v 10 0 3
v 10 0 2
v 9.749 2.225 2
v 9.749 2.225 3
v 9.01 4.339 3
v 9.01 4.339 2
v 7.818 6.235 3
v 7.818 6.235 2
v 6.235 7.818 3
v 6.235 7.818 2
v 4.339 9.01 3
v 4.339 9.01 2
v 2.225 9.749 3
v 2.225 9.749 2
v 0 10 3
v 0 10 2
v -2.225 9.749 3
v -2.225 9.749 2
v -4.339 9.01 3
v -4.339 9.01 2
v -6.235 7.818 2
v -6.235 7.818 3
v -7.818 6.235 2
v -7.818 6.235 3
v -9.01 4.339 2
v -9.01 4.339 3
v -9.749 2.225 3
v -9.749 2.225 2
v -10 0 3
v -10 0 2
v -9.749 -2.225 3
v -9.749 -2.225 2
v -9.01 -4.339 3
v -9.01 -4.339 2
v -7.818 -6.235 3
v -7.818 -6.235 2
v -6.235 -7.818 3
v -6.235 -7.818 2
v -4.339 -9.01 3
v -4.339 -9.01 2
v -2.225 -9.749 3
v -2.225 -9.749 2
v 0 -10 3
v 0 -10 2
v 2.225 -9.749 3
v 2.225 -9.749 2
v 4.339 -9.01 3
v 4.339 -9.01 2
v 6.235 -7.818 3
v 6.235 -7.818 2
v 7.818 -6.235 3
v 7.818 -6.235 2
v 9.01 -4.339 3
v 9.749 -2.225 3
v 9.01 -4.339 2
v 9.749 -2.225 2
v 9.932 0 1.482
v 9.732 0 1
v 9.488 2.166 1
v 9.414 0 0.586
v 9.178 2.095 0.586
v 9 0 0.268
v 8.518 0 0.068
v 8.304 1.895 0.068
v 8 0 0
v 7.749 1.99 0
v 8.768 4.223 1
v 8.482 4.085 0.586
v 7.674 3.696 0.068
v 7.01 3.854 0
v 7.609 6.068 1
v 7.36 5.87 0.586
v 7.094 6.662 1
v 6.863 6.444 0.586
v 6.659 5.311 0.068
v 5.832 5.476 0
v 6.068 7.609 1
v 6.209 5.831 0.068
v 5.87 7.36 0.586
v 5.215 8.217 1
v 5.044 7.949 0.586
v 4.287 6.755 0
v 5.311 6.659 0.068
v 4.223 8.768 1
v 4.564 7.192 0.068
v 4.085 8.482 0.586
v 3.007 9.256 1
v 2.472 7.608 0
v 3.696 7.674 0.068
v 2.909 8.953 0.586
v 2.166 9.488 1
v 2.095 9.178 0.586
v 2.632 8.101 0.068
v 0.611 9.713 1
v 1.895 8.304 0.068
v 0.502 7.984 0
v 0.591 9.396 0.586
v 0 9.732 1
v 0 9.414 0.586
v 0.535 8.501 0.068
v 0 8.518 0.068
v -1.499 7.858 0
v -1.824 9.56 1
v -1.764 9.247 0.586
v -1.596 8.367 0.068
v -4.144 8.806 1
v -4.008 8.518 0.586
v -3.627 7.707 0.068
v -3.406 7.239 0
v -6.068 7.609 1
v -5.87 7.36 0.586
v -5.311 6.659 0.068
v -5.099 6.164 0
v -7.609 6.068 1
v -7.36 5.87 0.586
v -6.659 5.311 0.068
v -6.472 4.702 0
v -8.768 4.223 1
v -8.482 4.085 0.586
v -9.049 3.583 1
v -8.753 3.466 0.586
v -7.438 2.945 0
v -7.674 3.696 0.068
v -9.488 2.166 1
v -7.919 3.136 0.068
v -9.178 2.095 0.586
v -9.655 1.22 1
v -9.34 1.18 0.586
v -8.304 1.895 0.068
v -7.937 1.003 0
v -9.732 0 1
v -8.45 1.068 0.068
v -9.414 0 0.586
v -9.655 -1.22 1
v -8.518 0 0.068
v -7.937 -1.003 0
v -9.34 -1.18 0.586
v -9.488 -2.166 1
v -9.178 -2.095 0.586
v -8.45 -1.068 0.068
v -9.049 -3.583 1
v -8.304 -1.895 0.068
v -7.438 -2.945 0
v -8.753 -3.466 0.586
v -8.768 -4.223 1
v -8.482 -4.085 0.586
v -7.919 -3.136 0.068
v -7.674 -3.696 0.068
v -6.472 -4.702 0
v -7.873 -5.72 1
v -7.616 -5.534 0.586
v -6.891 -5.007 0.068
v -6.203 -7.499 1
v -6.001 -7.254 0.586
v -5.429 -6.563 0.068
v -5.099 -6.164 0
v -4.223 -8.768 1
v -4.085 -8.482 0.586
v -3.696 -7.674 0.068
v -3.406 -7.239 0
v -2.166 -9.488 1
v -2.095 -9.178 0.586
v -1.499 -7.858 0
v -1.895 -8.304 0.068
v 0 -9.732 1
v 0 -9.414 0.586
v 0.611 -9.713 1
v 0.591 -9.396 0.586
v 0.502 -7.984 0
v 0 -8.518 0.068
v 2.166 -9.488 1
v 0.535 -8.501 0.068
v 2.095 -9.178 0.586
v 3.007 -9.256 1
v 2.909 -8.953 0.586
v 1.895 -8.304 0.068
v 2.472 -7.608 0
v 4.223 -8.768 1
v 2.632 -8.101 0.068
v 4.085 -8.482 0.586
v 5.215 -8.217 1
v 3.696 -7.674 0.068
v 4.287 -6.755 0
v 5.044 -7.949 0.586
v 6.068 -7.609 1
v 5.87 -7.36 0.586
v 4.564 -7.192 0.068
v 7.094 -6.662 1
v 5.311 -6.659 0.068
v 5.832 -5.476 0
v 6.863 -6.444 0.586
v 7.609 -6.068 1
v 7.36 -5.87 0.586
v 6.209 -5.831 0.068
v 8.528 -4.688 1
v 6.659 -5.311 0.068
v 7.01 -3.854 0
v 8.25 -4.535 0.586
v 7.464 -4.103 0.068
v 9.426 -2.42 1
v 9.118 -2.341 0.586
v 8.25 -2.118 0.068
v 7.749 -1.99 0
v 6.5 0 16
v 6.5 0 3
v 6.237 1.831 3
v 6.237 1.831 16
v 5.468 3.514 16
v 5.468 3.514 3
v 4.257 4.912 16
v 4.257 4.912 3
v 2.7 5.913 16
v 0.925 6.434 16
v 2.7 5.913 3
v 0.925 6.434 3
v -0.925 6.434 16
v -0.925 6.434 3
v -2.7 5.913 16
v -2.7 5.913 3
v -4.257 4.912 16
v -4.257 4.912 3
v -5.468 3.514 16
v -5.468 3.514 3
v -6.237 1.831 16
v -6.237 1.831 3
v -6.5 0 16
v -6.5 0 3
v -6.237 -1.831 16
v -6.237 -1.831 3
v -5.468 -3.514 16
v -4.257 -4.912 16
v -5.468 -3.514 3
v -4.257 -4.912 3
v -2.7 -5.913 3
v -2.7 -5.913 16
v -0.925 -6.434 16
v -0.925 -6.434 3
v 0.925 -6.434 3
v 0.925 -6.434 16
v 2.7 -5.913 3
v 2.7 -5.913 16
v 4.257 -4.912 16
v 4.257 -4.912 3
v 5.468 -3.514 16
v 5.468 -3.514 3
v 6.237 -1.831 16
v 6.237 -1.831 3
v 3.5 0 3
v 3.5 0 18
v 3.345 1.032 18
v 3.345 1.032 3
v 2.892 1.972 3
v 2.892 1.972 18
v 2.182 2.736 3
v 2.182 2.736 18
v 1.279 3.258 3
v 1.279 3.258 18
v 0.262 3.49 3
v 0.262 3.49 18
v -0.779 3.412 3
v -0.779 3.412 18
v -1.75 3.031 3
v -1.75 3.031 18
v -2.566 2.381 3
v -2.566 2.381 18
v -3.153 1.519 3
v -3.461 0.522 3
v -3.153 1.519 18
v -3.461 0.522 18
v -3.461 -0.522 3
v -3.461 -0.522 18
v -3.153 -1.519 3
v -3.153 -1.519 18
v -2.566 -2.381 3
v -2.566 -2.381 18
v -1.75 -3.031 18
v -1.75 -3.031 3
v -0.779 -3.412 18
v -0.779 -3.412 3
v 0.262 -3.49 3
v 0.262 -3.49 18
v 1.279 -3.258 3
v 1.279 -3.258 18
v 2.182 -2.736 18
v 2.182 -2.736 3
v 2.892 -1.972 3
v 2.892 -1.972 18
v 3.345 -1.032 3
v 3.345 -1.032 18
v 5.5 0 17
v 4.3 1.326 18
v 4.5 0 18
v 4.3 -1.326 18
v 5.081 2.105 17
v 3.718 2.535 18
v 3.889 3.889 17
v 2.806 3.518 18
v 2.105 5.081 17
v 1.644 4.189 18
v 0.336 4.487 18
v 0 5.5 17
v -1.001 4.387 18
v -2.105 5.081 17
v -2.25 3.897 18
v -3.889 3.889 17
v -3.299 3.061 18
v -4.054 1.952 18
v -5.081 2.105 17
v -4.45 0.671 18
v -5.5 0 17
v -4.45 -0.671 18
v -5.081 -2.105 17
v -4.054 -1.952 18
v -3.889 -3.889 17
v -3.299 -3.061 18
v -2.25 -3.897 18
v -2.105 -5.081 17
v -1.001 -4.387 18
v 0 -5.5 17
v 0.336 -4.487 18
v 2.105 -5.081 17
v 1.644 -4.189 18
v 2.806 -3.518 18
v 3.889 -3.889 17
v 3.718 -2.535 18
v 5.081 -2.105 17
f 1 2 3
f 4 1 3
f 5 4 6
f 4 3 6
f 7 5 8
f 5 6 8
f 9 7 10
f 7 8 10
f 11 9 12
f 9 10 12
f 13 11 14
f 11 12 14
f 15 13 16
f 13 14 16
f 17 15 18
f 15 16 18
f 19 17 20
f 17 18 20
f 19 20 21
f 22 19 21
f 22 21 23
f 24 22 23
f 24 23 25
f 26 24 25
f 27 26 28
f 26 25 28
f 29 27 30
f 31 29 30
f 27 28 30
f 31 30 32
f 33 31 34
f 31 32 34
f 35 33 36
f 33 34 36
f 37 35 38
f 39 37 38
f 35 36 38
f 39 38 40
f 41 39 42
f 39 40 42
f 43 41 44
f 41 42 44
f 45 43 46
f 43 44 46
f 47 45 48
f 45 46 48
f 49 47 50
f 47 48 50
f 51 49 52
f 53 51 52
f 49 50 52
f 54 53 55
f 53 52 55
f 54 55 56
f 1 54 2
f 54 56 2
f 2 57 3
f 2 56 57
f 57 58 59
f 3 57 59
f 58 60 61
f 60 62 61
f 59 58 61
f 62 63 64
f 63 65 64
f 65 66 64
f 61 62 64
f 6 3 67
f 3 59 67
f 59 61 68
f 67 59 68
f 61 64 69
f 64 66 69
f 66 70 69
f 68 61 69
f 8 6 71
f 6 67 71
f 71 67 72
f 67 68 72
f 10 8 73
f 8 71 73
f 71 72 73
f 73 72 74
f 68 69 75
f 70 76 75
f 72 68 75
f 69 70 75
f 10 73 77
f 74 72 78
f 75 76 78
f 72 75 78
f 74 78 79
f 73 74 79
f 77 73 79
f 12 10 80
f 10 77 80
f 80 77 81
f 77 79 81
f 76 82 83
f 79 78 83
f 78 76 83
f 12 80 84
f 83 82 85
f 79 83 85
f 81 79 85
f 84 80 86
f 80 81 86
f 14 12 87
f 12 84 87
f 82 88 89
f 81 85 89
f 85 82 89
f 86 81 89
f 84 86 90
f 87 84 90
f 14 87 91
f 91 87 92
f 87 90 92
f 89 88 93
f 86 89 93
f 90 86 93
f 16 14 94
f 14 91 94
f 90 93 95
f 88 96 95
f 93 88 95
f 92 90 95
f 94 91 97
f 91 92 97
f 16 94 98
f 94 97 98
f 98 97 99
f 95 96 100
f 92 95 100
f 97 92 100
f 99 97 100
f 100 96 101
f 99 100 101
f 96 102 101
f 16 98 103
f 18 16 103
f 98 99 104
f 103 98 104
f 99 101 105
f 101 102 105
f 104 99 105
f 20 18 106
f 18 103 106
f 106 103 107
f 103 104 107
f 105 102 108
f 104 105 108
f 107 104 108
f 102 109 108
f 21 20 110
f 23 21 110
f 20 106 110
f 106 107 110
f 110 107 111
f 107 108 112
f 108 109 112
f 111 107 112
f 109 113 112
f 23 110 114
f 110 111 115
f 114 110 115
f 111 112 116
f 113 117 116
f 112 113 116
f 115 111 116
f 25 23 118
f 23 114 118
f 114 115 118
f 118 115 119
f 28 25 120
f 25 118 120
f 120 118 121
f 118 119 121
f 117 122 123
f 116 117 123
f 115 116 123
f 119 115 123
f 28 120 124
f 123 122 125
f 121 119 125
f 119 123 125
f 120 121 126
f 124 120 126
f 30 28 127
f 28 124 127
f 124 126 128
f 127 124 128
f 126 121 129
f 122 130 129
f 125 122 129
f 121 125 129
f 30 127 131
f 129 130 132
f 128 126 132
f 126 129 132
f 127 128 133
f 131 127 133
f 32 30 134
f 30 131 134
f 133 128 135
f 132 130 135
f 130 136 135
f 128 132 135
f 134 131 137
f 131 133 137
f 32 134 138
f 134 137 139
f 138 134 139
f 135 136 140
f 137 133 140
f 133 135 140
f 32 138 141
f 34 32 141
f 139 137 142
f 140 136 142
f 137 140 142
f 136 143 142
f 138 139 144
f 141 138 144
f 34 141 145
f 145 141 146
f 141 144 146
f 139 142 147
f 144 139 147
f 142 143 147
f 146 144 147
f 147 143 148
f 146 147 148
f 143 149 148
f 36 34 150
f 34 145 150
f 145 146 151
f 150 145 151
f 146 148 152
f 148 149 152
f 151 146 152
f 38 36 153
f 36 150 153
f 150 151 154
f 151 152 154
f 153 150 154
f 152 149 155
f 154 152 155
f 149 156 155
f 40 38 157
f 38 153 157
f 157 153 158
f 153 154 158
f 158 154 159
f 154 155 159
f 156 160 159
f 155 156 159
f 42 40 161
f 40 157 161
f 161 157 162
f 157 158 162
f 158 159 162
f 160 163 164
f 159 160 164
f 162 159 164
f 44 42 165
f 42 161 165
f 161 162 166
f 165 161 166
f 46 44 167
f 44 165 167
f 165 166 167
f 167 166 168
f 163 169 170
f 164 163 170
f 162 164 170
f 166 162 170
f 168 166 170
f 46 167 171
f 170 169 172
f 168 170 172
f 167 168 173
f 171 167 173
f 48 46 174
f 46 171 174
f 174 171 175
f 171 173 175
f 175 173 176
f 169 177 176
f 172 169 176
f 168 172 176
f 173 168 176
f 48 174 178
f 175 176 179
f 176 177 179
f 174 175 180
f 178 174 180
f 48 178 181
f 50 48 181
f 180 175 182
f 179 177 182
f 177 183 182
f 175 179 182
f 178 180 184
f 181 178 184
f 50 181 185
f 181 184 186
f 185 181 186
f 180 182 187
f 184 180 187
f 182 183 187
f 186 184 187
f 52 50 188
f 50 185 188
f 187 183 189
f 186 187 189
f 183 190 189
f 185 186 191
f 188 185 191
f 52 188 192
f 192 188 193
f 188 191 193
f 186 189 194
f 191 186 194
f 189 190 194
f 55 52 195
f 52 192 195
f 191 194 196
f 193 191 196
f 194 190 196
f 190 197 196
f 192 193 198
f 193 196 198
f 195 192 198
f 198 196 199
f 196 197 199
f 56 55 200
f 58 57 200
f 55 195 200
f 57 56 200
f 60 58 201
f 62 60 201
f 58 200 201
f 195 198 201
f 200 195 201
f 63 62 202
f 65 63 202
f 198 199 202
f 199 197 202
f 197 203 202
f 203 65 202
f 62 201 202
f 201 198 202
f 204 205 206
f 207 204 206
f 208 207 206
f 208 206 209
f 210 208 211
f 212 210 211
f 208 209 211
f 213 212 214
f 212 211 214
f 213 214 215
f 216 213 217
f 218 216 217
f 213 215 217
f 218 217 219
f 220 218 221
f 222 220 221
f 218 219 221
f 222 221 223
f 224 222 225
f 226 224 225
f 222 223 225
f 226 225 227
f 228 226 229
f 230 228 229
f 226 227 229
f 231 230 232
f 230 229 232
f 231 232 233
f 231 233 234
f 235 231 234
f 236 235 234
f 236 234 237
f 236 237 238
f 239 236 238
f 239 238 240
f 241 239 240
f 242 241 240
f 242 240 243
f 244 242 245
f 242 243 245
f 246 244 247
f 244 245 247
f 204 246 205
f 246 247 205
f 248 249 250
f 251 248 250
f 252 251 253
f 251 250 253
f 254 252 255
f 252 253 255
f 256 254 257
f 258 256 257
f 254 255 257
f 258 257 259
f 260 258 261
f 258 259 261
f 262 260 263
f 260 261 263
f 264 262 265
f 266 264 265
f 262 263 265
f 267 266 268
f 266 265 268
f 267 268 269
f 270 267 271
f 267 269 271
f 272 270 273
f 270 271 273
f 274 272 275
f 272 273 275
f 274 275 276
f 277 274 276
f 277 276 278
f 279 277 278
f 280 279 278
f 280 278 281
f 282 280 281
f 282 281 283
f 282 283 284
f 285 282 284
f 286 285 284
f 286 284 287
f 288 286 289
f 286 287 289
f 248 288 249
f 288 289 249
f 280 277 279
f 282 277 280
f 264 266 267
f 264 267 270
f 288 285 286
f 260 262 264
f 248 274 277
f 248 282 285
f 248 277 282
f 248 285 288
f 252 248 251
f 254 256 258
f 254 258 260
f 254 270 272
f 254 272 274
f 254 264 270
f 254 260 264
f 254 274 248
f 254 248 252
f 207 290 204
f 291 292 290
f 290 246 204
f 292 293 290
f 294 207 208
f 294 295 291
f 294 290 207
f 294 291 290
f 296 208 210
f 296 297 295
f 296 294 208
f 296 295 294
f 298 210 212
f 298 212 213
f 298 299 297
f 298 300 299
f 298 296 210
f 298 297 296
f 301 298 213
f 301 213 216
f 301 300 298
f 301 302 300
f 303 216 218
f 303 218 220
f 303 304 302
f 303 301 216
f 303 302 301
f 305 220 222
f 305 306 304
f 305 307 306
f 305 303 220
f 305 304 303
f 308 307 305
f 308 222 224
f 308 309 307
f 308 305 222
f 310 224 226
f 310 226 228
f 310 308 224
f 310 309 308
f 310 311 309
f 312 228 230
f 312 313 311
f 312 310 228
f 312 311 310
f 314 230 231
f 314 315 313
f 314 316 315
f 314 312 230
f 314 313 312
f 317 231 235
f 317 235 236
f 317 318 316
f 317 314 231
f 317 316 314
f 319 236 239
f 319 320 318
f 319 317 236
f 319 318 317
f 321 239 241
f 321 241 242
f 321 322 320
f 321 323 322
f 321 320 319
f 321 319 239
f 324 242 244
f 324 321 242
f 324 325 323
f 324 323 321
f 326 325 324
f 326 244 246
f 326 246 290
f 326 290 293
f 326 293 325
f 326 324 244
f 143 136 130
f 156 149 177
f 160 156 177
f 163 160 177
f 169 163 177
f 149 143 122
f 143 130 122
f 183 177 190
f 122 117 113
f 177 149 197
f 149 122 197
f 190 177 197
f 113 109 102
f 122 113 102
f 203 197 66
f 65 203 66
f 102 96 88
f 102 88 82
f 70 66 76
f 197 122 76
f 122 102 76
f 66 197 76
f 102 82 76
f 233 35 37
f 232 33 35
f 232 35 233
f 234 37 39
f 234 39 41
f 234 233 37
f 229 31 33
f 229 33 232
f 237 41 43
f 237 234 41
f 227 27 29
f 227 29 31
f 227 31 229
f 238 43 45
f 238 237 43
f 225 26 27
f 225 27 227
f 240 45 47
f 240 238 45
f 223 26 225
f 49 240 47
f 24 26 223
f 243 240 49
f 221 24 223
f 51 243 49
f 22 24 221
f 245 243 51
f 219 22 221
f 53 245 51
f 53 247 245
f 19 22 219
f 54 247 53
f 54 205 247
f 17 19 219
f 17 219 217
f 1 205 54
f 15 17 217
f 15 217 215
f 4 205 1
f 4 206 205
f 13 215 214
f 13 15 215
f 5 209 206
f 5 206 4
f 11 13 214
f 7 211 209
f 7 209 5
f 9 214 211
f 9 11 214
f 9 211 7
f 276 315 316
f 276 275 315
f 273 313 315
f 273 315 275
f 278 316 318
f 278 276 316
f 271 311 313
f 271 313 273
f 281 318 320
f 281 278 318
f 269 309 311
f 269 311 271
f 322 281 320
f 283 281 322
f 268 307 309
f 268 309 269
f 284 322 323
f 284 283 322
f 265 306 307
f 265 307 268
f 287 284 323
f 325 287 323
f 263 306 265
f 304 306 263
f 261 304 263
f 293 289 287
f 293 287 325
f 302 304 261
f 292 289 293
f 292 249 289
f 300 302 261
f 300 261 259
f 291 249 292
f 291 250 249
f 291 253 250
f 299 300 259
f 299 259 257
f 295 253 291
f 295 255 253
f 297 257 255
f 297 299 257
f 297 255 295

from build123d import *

# Parameters (mm, degrees)
SKETCH_R     = 10
PAD_DEPTH    = 3
SKETCH001_R  = 6.5
PAD001_DEPTH = 15
SKETCH002_R  = 3.5
POCKET_DEPTH = 15
FILLET_R     = 2
CHAMFER_SIZE = 2


with BuildPart() as part:
    # Sketch → Pad (new body)
    with BuildSketch(Plane.XY):
        Circle(SKETCH_R)
    extrude(amount=PAD_DEPTH)

    # Sketch001 (on Face3 of Pad) → Pad001 (join)
    with BuildSketch(Plane.XY.offset(3)):
        Circle(SKETCH001_R)
    extrude(amount=PAD001_DEPTH)

    # Sketch002 (on Face5 of Pad001) → Pocket (cut)
    with BuildSketch(Plane.XY.offset(18)):
        Circle(SKETCH002_R)
    extrude(amount=-POCKET_DEPTH, mode=Mode.SUBTRACT)

    # Fillet
    fillet_edges = [part.edges().sort_by_distance(p)[0] for p in [
        (-10, 0, 0),
    ]]
    fillet(fillet_edges, radius=FILLET_R)

    # Chamfer
    chamfer_edges = [part.edges().sort_by_distance(p)[0] for p in [
        (-6.5, 0, 18),
    ]]
    chamfer(chamfer_edges, length=CHAMFER_SIZE)


solid = part.part
